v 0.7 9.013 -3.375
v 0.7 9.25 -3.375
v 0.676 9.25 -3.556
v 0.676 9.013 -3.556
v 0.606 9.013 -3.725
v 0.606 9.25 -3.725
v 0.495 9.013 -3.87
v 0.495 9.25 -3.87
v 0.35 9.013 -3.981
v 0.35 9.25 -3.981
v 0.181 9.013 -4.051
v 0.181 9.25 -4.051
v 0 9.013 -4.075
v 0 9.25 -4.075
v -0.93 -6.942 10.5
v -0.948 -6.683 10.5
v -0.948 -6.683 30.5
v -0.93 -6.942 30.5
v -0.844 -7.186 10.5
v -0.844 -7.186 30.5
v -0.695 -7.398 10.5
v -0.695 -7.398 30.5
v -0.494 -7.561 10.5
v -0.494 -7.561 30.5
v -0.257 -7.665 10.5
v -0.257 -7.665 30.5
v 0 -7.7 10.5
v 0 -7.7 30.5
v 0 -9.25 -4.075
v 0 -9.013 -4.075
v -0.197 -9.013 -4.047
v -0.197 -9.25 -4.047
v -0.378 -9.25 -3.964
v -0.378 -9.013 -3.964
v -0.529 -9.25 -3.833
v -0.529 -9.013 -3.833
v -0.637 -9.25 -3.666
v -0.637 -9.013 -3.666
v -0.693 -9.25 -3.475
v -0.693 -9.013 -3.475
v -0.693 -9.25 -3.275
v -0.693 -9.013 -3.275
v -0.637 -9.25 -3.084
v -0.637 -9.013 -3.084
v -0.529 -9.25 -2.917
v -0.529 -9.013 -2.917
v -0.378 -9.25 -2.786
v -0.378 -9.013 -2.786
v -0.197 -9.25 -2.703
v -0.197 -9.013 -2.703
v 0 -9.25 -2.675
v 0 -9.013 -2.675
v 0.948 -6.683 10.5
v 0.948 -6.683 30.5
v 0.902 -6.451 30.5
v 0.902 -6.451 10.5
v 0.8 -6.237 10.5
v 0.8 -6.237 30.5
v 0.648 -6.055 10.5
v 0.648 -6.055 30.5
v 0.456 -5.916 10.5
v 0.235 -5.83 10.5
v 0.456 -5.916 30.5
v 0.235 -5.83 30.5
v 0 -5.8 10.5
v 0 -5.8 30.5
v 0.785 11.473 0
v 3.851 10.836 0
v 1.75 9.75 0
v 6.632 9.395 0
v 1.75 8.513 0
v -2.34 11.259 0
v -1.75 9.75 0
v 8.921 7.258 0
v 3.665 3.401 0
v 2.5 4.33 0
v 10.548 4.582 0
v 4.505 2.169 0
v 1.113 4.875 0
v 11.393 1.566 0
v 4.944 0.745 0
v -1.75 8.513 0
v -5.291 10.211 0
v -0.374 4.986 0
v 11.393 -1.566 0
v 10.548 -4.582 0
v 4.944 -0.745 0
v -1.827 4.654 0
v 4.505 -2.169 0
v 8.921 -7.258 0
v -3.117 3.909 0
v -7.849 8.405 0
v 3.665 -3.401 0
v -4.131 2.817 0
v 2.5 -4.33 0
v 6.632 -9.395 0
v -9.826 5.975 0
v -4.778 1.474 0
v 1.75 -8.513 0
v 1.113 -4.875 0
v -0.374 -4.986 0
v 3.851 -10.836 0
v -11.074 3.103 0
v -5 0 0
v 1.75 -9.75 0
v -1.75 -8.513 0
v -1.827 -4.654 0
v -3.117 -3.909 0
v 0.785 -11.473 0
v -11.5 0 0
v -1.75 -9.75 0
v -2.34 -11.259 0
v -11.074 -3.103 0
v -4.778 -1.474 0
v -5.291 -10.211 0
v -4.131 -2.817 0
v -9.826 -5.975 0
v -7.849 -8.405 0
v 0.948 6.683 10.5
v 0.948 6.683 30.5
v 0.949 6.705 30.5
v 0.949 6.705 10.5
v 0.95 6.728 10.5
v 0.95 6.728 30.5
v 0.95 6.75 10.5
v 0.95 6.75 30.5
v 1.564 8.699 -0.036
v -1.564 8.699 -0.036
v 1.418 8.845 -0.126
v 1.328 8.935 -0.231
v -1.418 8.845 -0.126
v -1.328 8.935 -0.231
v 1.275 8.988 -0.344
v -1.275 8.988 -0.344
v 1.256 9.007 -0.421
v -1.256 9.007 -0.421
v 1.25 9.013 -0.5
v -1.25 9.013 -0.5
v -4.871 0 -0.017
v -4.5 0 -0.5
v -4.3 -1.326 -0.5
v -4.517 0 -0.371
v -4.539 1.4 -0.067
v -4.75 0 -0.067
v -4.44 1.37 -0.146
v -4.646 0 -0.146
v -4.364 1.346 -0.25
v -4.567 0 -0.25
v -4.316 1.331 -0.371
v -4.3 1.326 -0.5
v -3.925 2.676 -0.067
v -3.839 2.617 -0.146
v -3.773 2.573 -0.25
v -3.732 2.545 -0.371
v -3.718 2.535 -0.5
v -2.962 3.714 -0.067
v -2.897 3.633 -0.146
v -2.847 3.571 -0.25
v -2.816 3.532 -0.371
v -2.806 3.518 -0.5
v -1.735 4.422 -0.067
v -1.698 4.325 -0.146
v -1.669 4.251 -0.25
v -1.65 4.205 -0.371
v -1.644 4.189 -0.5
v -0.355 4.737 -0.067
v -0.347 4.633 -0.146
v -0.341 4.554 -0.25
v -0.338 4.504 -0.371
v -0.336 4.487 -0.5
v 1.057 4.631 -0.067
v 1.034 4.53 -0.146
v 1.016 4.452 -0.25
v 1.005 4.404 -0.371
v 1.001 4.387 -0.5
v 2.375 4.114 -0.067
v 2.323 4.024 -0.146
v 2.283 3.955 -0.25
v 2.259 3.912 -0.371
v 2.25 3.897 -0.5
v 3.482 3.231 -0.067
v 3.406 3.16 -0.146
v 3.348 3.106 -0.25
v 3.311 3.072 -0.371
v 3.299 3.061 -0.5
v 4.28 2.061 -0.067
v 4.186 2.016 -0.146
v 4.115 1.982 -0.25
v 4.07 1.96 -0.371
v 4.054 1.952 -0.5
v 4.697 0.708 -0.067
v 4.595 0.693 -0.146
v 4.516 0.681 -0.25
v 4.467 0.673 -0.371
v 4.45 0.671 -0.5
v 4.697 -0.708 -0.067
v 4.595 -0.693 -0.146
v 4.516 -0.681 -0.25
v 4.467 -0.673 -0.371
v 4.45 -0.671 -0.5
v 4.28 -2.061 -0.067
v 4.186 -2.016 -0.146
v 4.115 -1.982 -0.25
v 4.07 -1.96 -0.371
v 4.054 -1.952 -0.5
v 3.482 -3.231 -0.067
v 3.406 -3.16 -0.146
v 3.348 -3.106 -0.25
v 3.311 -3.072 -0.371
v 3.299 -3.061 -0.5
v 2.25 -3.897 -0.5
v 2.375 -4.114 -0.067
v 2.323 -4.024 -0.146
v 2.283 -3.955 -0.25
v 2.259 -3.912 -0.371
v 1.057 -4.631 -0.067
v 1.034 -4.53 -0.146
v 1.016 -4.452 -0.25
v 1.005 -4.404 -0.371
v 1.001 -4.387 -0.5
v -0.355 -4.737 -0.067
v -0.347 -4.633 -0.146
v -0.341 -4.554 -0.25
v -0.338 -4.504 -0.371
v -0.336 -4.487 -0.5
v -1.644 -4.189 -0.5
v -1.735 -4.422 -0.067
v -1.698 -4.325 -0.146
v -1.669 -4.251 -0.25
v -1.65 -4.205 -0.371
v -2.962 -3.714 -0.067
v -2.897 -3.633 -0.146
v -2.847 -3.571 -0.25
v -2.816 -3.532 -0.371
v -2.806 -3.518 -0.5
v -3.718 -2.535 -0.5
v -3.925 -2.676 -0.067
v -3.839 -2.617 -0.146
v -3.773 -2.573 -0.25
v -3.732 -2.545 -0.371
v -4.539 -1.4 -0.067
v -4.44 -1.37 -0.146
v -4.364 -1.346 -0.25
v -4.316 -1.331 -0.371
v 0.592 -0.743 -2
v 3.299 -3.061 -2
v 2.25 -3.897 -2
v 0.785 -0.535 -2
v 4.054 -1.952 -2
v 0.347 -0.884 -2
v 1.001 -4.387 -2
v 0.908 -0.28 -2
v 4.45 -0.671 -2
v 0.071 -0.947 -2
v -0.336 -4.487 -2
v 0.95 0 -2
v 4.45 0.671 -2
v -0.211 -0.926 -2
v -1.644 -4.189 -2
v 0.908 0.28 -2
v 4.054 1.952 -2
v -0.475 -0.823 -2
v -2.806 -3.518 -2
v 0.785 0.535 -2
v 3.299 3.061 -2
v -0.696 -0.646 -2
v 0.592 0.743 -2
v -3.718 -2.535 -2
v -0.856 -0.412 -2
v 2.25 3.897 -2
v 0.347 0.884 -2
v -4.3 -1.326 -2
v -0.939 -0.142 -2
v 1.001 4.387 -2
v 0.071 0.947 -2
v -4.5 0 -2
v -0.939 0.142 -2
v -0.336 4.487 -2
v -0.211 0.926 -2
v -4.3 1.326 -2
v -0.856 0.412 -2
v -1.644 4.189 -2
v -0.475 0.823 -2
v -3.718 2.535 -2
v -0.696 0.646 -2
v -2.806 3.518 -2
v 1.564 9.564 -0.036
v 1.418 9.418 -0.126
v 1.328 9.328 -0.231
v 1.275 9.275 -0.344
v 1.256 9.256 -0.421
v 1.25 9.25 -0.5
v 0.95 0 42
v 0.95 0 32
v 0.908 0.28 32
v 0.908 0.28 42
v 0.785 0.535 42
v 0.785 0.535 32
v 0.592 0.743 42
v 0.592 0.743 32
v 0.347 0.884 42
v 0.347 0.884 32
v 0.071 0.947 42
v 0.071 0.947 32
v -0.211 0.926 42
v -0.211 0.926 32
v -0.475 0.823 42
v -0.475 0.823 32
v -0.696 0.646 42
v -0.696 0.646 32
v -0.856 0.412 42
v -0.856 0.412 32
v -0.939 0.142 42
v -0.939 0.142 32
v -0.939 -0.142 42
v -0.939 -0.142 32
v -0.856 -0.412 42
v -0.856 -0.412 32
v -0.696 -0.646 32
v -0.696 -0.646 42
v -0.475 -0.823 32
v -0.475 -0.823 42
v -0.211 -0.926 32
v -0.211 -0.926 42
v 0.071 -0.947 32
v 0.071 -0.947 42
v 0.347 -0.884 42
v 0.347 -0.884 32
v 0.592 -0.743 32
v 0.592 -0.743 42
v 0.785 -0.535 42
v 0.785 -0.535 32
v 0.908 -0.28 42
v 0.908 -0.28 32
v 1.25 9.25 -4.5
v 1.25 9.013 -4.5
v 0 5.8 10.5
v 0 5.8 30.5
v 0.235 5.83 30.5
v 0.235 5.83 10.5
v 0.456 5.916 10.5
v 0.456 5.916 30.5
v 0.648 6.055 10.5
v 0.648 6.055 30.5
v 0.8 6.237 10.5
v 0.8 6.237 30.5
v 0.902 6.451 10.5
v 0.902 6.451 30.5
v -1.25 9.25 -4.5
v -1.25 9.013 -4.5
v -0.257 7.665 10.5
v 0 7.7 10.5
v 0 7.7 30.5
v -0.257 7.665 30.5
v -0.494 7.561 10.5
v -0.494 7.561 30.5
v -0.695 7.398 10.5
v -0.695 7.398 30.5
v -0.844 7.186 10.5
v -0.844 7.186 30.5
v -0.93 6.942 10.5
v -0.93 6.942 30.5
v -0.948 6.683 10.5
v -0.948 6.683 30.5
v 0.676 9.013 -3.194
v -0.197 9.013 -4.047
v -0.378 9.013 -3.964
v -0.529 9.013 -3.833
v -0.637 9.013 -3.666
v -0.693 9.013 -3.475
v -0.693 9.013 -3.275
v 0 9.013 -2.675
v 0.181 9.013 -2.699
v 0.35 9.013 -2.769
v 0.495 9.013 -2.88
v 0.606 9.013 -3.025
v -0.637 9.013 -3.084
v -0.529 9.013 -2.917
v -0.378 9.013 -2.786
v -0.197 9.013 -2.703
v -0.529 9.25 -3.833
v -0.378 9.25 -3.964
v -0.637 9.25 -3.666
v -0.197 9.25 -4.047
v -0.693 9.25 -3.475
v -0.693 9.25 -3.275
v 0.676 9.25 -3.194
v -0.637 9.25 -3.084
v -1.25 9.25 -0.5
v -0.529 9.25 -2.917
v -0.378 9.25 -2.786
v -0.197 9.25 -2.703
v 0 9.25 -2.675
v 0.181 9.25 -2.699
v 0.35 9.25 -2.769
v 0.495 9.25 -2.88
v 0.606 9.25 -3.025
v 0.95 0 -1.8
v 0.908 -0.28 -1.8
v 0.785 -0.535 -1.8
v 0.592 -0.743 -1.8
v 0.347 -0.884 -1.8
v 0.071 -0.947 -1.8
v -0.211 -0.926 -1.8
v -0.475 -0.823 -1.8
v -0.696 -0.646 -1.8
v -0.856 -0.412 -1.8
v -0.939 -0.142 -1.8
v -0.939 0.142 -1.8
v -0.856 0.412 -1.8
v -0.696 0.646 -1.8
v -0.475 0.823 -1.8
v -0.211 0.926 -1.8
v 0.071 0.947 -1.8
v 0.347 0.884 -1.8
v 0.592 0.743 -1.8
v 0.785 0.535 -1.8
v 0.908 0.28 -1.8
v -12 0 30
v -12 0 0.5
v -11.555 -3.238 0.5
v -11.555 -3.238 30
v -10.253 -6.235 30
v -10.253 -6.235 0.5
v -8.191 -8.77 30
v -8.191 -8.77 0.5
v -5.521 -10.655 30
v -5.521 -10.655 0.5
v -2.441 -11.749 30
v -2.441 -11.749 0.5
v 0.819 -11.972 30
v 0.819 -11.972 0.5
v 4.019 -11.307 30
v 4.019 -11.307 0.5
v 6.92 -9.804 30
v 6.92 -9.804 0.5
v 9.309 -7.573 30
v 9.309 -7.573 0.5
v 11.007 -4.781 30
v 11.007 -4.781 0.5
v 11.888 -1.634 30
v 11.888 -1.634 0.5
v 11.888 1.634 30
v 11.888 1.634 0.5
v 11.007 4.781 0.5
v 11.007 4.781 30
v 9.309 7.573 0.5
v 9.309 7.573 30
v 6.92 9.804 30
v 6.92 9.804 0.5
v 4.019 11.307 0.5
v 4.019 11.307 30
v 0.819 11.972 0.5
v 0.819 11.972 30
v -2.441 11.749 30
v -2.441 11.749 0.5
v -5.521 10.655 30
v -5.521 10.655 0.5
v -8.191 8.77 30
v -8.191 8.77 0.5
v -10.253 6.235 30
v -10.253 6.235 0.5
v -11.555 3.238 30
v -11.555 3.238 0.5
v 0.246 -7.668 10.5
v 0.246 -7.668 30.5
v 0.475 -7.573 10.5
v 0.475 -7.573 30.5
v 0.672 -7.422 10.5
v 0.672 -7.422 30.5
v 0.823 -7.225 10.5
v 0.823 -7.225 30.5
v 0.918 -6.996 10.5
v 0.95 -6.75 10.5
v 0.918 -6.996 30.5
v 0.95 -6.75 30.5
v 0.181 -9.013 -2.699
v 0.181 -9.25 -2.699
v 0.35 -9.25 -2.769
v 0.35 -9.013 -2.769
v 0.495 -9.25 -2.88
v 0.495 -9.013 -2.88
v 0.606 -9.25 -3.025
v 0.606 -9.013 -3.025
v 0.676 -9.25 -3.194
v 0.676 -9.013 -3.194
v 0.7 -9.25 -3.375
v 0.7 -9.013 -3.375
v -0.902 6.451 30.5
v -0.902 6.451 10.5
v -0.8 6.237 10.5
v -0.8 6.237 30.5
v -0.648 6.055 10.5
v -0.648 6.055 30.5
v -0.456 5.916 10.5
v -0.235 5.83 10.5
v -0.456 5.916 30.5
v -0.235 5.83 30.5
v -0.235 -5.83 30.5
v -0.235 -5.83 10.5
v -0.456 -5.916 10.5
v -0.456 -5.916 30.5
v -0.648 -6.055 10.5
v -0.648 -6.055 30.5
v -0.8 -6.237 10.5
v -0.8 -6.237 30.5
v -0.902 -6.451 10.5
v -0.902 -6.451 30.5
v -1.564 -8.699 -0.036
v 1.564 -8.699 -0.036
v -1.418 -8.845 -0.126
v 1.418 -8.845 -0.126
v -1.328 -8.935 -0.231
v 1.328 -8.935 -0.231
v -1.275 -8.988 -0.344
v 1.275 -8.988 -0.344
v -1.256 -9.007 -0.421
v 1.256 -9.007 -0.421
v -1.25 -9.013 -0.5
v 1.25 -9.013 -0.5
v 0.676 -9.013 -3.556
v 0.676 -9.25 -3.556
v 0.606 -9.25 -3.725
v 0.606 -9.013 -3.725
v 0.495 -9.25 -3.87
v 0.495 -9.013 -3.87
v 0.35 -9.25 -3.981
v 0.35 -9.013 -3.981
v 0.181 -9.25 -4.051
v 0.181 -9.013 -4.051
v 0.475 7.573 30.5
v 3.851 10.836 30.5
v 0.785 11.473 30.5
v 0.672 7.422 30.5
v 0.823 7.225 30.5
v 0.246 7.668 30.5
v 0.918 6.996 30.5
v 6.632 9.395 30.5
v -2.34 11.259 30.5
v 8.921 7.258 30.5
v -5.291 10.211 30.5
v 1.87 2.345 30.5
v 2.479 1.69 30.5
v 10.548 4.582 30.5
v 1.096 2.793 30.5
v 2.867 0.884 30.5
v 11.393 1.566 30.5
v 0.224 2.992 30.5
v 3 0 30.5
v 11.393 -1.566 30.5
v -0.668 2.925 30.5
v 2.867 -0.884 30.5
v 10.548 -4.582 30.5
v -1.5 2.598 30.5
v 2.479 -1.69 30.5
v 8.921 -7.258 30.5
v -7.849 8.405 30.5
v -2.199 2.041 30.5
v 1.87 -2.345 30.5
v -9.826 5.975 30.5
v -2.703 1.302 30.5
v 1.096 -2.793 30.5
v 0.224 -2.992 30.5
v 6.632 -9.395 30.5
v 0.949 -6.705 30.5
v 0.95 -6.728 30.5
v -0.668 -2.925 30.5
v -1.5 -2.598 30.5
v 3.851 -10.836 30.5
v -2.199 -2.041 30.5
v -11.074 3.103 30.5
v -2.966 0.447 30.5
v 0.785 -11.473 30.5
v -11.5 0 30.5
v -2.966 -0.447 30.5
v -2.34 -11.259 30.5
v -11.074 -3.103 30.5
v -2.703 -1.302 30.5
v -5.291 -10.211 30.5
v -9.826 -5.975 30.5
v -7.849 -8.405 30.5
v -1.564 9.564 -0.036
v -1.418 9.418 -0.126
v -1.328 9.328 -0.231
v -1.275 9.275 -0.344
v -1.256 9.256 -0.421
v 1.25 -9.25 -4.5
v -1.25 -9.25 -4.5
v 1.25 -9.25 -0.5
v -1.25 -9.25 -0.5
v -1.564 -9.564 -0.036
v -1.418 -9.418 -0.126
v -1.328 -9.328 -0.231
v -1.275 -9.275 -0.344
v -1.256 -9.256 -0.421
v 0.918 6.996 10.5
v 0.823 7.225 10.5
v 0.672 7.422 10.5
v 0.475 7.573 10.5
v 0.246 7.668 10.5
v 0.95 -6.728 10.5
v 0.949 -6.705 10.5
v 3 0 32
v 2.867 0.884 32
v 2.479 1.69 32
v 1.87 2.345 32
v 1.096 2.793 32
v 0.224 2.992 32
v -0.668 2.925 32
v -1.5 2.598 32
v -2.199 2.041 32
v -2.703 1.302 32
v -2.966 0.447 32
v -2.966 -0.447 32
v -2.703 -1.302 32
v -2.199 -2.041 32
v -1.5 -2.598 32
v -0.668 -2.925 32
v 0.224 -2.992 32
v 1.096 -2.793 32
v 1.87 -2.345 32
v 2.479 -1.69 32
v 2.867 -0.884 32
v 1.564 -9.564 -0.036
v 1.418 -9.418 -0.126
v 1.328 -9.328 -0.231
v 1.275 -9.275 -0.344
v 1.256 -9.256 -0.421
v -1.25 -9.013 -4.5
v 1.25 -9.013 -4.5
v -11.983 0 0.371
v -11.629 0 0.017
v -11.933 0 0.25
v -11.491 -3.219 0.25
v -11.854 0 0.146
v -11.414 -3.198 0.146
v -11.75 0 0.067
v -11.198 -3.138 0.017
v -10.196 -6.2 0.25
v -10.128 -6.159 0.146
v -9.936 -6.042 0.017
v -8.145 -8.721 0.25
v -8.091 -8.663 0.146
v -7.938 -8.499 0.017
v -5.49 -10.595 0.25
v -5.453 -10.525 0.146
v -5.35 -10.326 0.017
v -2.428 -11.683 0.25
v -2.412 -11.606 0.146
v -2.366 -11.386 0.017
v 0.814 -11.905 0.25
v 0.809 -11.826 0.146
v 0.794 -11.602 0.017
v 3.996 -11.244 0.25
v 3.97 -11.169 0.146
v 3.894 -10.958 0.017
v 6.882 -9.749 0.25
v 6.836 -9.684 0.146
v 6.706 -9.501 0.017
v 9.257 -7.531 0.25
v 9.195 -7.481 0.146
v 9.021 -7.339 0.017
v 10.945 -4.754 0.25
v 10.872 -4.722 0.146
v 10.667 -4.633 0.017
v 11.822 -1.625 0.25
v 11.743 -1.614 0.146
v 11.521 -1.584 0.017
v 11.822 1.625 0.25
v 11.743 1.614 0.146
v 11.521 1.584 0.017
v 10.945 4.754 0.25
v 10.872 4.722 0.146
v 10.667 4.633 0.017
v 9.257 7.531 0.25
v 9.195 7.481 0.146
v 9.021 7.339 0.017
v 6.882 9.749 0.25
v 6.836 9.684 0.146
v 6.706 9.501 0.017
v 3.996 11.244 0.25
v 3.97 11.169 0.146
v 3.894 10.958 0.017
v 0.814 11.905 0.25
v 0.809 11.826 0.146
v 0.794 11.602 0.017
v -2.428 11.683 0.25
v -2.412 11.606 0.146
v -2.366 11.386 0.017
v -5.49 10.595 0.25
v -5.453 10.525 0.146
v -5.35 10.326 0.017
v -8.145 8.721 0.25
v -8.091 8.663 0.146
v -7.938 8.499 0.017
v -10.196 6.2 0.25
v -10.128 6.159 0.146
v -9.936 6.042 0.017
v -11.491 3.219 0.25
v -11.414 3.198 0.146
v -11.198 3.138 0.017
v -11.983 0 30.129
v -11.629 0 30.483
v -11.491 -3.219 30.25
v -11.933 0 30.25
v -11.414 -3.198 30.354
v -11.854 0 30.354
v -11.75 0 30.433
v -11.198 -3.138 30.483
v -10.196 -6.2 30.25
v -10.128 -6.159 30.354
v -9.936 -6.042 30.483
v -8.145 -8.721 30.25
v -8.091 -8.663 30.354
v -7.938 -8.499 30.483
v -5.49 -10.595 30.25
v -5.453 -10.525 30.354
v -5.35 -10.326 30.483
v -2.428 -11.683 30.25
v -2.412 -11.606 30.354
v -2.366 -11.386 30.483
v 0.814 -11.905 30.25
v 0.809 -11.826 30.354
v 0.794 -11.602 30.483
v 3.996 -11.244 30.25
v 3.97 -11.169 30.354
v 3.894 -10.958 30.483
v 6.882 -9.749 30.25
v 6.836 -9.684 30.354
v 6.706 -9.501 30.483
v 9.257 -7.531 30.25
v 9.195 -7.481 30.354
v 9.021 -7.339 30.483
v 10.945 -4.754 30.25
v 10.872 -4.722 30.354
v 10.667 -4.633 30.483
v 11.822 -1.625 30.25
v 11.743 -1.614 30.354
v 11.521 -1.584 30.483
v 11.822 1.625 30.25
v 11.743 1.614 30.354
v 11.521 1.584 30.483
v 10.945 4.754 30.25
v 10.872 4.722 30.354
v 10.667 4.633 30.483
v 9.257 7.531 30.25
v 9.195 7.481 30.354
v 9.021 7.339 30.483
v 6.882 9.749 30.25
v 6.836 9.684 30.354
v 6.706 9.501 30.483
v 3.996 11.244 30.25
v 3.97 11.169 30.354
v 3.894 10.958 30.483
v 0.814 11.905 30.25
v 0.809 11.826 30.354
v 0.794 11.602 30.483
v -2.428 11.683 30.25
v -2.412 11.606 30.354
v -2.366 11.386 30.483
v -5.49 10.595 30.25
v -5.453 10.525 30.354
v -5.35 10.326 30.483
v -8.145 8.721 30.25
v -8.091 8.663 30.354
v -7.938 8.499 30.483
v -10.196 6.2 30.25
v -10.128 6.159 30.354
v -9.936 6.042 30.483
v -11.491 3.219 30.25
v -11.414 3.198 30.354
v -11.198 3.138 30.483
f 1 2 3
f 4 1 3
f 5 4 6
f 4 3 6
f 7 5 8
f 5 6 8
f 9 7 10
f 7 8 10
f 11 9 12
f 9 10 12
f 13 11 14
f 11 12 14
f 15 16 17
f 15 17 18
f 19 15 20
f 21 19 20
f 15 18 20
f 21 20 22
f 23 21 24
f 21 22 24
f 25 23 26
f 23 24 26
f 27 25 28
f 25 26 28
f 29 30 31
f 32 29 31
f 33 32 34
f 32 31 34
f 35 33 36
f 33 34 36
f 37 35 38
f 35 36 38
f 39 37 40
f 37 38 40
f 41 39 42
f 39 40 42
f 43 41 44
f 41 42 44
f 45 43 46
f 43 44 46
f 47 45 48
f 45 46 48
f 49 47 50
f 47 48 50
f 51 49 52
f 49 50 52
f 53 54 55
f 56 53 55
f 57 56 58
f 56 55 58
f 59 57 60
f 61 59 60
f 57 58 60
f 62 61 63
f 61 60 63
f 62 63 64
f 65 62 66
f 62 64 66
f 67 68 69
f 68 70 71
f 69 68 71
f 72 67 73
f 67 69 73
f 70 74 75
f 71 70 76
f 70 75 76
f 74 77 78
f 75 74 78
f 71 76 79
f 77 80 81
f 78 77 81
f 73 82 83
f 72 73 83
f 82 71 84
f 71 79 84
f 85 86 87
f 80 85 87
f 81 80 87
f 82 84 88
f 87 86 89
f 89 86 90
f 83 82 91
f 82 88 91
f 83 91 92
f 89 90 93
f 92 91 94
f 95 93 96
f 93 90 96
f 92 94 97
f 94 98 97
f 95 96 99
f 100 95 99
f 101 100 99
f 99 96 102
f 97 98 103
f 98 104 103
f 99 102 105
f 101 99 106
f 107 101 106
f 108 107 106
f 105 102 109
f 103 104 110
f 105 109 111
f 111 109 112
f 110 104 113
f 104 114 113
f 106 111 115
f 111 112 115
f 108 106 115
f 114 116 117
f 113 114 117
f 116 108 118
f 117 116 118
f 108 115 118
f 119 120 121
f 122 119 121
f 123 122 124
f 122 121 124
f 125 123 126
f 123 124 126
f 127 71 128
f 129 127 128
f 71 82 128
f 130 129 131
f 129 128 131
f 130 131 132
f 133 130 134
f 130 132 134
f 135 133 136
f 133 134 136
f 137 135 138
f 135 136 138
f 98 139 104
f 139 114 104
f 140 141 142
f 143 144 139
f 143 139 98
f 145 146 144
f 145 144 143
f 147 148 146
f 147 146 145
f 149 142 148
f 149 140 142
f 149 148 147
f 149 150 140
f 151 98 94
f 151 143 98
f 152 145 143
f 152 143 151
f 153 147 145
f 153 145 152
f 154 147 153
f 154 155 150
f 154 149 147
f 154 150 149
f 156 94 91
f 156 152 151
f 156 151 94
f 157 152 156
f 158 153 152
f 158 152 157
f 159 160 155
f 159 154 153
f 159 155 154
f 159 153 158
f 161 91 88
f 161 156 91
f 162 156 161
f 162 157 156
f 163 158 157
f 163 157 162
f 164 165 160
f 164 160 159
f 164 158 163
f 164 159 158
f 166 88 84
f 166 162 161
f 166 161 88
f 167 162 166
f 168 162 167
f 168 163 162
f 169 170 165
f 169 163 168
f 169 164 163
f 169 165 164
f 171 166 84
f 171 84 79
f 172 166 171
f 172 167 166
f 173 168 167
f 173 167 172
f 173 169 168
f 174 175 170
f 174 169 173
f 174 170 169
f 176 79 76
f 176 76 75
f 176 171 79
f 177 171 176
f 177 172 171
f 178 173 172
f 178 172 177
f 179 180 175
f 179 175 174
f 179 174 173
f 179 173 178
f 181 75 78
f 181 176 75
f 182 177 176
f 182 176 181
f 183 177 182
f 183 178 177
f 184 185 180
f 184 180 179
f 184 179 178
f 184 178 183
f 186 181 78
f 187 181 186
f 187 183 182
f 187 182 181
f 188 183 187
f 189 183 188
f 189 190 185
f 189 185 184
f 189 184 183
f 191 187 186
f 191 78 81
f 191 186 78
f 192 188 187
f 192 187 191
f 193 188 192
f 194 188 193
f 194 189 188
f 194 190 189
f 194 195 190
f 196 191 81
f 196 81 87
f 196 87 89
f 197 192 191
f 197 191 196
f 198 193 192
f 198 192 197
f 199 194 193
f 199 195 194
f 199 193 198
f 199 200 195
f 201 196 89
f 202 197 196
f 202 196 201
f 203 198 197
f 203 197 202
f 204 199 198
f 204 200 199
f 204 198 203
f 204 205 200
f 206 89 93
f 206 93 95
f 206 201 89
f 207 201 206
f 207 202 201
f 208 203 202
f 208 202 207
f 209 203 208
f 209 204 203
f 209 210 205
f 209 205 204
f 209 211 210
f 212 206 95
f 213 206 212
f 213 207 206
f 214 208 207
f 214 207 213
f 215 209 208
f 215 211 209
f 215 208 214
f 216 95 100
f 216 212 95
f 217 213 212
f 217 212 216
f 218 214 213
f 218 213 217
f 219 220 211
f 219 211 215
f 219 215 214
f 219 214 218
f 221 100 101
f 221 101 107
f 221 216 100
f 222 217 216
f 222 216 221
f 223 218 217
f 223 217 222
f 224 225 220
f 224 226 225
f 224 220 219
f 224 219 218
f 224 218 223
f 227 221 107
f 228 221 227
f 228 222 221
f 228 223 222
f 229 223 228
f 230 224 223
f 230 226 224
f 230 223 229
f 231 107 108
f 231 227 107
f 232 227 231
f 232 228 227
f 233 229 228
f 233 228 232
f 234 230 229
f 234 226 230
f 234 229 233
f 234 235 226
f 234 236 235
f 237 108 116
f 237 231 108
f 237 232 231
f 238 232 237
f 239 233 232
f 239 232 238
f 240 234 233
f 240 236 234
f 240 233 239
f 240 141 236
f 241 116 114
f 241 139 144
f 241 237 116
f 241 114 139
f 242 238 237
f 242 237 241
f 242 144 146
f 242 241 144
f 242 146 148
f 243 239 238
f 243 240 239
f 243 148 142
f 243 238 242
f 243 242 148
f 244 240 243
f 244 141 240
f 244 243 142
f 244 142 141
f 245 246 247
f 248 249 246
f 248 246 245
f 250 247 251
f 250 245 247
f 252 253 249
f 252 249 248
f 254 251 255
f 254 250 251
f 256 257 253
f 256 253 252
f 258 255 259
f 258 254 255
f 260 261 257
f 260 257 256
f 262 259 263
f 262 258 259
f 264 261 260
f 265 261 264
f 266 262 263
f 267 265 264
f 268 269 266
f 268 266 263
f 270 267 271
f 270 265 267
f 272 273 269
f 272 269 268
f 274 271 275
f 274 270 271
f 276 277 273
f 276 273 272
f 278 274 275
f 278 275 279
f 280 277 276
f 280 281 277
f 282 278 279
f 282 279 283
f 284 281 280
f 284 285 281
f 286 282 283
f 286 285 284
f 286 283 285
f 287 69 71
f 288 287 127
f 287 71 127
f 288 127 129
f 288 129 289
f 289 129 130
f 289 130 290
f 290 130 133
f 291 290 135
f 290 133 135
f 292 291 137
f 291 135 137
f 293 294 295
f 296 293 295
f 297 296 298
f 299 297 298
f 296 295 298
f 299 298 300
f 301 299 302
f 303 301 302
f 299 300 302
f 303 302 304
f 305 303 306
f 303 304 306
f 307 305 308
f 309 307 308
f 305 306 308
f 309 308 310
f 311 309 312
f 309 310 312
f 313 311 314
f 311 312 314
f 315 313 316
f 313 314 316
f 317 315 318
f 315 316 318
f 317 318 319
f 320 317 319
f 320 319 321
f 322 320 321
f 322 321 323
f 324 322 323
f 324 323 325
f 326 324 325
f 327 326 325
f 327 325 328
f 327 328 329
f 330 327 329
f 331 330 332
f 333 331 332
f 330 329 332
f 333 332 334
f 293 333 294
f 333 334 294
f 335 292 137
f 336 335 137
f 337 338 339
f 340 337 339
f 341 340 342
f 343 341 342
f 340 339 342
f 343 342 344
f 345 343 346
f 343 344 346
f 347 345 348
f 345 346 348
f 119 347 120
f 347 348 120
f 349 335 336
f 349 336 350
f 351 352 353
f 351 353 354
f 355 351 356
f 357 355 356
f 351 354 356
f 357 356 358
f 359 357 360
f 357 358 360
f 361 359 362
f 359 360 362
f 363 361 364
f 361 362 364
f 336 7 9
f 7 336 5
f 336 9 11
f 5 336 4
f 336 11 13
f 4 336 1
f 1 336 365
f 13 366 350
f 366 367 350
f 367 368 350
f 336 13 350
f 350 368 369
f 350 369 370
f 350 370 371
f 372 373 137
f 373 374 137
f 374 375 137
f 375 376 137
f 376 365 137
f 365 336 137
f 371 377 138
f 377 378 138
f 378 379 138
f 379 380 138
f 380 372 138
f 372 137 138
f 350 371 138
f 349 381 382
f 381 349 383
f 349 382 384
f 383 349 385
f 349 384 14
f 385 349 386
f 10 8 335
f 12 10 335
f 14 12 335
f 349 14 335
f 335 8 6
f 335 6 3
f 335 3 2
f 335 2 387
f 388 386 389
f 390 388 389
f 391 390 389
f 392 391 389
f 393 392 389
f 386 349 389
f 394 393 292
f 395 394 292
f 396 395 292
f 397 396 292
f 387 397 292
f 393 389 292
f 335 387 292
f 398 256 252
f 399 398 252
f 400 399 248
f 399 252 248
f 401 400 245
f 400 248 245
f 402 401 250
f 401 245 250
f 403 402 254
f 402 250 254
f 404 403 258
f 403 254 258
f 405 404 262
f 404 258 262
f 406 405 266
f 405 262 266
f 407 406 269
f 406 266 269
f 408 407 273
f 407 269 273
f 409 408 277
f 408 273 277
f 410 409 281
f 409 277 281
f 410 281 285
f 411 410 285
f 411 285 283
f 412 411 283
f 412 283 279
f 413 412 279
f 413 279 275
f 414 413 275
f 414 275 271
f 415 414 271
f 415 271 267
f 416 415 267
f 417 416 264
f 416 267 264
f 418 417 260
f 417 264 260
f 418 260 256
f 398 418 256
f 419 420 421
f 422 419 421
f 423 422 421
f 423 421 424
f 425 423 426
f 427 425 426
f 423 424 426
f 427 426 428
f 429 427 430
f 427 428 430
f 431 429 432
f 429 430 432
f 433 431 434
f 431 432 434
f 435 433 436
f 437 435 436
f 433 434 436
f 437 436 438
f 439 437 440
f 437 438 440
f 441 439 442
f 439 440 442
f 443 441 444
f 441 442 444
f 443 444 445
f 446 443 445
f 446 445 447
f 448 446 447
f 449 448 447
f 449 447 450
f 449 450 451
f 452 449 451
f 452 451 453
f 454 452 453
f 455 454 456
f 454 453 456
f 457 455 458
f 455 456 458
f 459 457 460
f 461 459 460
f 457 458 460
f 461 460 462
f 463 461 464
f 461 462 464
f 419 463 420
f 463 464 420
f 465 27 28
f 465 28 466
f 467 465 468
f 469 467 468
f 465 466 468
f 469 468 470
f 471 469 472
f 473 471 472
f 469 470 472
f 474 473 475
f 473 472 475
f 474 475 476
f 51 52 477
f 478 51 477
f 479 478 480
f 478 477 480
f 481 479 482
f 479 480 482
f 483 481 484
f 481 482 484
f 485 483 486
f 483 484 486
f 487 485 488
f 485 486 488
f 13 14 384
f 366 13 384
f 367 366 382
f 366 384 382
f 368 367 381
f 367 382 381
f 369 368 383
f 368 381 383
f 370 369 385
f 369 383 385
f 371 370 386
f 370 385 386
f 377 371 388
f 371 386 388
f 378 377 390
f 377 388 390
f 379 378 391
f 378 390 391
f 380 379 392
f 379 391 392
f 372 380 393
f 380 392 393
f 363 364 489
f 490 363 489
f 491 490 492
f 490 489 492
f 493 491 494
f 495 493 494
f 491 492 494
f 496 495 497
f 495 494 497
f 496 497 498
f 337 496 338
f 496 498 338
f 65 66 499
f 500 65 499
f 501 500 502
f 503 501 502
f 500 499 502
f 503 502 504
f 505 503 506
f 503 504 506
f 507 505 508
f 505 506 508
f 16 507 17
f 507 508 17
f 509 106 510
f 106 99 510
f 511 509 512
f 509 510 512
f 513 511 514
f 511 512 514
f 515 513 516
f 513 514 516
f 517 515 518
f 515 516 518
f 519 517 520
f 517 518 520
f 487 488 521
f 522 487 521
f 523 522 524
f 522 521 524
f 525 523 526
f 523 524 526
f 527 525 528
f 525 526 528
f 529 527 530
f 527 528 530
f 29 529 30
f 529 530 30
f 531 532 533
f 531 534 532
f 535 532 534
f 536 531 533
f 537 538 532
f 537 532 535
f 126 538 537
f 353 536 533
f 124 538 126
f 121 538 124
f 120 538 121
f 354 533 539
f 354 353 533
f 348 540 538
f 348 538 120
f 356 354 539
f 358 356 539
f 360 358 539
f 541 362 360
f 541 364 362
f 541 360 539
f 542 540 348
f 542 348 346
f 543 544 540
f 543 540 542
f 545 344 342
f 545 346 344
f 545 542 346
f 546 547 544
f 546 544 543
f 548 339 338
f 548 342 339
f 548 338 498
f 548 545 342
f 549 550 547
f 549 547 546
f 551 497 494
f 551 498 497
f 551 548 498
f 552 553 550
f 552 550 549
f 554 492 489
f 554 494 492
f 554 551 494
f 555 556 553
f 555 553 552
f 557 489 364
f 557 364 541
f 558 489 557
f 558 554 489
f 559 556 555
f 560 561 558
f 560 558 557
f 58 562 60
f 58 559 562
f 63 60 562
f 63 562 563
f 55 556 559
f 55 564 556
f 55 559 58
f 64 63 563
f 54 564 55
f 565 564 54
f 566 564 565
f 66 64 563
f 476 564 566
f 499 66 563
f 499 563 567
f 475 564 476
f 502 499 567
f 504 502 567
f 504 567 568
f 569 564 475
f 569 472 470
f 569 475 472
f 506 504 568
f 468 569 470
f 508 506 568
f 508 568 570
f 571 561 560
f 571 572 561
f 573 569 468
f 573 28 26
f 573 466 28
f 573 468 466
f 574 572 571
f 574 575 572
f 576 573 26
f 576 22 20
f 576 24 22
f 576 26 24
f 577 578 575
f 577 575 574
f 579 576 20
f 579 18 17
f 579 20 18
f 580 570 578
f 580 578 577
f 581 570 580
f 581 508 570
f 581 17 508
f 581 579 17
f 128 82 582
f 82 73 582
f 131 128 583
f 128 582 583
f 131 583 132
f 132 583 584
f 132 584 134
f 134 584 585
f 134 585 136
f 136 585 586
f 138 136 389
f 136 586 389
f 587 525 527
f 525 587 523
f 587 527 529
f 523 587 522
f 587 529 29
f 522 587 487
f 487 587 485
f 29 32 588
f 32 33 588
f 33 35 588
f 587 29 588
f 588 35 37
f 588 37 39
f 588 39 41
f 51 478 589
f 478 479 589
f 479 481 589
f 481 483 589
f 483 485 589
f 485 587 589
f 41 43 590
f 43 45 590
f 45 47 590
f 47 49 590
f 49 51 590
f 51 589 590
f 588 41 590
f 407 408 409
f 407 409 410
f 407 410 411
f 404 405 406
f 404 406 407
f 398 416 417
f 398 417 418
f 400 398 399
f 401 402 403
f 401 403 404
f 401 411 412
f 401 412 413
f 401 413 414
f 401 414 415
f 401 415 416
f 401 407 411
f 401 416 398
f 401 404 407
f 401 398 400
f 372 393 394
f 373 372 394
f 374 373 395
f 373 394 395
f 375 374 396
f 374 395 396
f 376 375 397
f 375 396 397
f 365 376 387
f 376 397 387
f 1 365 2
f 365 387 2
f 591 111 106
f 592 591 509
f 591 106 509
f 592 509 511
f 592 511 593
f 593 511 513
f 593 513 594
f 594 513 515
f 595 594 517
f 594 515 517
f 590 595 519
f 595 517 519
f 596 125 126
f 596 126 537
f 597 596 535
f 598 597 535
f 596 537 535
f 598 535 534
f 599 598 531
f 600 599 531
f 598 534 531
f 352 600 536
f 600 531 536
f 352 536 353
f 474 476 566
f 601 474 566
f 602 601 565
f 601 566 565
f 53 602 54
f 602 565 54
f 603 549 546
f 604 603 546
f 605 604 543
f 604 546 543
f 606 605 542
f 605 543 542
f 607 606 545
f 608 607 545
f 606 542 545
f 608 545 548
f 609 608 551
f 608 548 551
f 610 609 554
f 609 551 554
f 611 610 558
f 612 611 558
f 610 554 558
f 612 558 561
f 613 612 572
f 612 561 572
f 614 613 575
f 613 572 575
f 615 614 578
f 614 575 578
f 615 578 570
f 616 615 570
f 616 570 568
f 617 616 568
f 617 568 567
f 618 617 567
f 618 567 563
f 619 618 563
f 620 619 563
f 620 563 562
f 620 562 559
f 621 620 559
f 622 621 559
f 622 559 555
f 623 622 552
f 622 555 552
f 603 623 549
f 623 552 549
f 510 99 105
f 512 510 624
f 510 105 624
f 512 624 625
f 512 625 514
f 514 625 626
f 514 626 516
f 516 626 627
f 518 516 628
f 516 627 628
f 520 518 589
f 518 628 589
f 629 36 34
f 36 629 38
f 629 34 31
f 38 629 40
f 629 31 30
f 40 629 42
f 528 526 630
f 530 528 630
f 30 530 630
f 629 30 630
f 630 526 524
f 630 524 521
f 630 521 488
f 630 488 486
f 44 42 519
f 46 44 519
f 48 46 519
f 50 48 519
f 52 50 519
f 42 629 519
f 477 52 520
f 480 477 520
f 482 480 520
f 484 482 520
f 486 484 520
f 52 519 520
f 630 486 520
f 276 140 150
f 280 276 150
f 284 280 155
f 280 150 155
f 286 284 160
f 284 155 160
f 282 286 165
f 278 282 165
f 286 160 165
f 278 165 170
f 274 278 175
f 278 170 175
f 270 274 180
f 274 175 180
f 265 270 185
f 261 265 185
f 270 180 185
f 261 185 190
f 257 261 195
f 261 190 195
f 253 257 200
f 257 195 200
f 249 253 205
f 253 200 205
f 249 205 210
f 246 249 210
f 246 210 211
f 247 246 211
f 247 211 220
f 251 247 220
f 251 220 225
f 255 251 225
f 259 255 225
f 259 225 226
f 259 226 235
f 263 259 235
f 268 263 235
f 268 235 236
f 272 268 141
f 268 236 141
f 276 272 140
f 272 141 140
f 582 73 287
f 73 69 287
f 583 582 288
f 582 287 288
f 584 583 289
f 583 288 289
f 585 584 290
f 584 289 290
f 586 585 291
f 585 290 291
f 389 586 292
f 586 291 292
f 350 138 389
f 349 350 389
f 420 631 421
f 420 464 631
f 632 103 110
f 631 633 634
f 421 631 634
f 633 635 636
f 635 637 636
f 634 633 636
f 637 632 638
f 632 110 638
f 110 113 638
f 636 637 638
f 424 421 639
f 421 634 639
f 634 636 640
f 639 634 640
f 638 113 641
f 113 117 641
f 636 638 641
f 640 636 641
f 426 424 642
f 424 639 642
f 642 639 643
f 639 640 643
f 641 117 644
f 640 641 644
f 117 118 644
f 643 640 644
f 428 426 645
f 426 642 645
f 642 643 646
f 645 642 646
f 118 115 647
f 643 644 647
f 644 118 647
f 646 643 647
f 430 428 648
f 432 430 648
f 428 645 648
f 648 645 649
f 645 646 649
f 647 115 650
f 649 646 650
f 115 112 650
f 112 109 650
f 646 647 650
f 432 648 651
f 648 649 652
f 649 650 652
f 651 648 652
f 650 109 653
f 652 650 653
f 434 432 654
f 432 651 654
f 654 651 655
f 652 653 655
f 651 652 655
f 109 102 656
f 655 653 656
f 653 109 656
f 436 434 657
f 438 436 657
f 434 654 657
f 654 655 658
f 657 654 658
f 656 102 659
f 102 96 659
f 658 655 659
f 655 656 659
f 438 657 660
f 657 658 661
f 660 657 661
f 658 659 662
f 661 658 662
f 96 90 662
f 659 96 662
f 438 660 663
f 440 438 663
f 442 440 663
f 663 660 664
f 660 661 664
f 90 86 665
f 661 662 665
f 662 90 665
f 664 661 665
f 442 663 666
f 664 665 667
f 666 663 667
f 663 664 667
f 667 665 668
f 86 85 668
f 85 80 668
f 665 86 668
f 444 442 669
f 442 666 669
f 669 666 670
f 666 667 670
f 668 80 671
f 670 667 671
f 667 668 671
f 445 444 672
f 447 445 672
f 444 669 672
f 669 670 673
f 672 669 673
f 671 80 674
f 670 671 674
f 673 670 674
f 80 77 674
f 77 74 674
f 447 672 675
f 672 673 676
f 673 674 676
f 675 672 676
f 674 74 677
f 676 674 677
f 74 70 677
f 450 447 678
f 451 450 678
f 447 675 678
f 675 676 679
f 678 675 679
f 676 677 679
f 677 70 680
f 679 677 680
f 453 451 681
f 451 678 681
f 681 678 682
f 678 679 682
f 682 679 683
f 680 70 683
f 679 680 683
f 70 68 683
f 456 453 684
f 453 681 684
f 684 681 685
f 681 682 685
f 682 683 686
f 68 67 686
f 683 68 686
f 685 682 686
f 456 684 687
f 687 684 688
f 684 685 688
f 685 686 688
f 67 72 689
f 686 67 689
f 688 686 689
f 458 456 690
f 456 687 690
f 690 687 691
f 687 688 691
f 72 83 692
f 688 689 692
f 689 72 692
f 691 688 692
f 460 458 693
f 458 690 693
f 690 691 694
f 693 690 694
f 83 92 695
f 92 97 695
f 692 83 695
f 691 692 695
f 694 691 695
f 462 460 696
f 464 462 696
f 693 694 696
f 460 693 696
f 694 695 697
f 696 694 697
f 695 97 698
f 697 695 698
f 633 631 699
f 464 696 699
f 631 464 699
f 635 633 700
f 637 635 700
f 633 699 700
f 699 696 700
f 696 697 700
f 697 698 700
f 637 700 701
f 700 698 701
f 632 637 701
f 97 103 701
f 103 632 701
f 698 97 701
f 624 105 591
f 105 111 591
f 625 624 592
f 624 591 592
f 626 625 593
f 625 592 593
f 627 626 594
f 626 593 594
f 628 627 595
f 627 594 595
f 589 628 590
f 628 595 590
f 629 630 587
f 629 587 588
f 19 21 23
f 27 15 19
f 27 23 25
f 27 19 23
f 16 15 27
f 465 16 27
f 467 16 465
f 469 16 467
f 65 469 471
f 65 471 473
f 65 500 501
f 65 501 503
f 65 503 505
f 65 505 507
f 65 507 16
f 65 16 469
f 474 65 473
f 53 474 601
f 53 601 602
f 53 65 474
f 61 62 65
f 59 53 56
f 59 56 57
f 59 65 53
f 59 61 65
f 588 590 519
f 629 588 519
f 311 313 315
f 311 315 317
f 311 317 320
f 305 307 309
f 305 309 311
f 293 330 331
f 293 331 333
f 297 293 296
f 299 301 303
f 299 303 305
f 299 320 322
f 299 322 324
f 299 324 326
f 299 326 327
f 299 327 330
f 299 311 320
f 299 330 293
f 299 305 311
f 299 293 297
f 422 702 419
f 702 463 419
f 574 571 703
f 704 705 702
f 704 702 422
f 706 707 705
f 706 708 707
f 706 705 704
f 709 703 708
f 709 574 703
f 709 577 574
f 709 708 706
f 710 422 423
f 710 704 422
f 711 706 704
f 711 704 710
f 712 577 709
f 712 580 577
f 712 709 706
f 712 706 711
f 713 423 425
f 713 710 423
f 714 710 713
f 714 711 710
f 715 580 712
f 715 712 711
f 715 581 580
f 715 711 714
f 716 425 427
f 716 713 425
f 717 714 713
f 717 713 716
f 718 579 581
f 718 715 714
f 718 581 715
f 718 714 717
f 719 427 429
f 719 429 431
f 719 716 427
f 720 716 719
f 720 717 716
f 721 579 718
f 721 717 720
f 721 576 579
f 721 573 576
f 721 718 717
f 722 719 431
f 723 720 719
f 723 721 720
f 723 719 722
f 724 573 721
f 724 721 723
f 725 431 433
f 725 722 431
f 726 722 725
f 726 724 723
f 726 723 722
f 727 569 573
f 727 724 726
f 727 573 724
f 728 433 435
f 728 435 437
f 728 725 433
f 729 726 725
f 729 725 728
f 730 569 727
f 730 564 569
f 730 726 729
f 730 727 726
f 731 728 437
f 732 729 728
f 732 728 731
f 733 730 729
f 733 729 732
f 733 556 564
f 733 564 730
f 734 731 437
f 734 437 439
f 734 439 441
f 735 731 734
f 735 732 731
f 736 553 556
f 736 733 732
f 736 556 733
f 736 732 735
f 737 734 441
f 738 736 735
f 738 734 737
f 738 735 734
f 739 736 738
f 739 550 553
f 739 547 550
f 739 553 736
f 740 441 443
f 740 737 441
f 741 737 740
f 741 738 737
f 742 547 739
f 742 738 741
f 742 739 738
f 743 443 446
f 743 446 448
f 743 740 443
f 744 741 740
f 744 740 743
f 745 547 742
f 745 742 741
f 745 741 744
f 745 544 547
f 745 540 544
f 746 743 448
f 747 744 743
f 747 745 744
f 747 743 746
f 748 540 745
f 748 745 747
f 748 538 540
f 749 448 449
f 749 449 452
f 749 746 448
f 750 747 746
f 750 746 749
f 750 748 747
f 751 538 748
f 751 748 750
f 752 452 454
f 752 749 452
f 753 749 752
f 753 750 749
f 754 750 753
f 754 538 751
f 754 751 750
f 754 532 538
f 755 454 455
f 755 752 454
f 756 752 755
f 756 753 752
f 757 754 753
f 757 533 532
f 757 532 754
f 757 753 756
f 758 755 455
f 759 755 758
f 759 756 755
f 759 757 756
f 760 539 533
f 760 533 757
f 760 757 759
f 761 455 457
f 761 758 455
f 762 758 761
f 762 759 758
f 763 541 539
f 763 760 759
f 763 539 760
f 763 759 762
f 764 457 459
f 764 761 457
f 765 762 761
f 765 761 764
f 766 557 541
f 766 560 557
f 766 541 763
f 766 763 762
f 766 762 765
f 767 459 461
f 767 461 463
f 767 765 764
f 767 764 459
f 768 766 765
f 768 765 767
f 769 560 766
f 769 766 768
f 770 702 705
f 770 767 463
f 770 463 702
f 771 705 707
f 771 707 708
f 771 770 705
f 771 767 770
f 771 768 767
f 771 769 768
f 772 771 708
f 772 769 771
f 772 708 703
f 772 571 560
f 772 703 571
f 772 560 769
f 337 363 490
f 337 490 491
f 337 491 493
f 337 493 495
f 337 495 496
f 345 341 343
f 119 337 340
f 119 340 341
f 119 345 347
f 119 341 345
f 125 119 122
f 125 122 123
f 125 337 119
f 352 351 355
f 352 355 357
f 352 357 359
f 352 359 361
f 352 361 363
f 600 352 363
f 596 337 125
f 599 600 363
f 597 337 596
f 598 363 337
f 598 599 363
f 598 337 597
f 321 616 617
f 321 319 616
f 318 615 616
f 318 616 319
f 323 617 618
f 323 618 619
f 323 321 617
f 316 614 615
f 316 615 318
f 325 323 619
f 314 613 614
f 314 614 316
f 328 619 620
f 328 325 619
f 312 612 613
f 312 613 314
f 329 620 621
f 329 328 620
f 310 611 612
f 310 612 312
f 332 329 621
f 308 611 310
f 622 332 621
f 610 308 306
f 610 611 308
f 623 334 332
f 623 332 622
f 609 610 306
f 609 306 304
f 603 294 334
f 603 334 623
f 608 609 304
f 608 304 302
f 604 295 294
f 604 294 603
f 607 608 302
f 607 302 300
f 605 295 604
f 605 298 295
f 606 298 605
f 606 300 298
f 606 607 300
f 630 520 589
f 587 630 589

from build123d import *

# Parameters (mm, degrees)
ESQUISSE1_R             = 12
BOSS_EXTRU_1_DEPTH      = 30.5
ESQUISSE2_R             = 4.5
BOSS_EXTRU_2_DEPTH      = 2
ESQUISSE3_R             = 3
BOSS_EXTRU_3_DEPTH      = 1.5
BOSS_EXTRU_4_DEPTH      = 4.5
ENL_V_MAT_EXTRU_1_DEPTH = 29.5
ESQUISSE6_R             = 0.95
BOSS_EXTRU_5_DEPTH      = 10
ESQUISSE7_R             = 0.95
ENL_V_MAT_EXTRU_2_DEPTH = 0.2
CONG_1_R                = 0.5
CONG_2_R                = 0.5
ENL_V_MAT_EXTRU_3_DEPTH = 20


with BuildPart() as part:
    # Esquisse1 → Boss.-Extru.1 (new body)
    with BuildSketch(Plane.XY):
        with Locations(Location((0, 0, 0), (0, 0, 180))):
            Circle(ESQUISSE1_R)
    extrude(amount=BOSS_EXTRU_1_DEPTH)

    # Esquisse2 → Boss.-Extru.2 (add)
    with BuildSketch(Plane(origin=(0, 0, 0), x_dir=(-1, 0, 0), z_dir=(0, 0, -1))):
        Circle(ESQUISSE2_R)
    extrude(amount=BOSS_EXTRU_2_DEPTH)

    # Esquisse3 → Boss.-Extru.3 (add)
    with BuildSketch(Plane.XY.offset(30.5)):
        Circle(ESQUISSE3_R)
    extrude(amount=BOSS_EXTRU_3_DEPTH)

    # Esquisse4 → Boss.-Extru.4 (add)
    with BuildSketch(Plane(origin=(0, 0, 0), x_dir=(-1, 0, 0), z_dir=(0, 0, -1))):
        with BuildLine():
            Line((0, -9.25), (0, -9.012847415))
            Line((0, -9.012847415), (-1.25, -9.012847415))
            Line((-1.25, -9.012847415), (-1.25, -9.16515139))
            ThreePointArc((-1.25, -9.16515139), (-0.626438203, -9.22876347), (0, -9.25))
        make_face()
        with BuildLine():
            Line((-1.25, -9.25), (0, -9.25))
            ThreePointArc((0, -9.25), (-0.626438203, -9.22876347), (-1.25, -9.16515139))
            Line((-1.25, -9.16515139), (-1.25, -9.25))
        make_face()
        with BuildLine():
            Line((1.25, -9.012847415), (0, -9.012847415))
            Line((0, -9.012847415), (0, -9.25))
            ThreePointArc((0, -9.25), (0.626438203, -9.22876347), (1.25, -9.16515139))
            Line((1.25, -9.16515139), (1.25, -9.012847415))
        make_face()
        with BuildLine():
            ThreePointArc((1.25, -9.16515139), (0.626438203, -9.22876347), (0, -9.25))
            Line((0, -9.25), (1.25, -9.25))
            Line((1.25, -9.25), (1.25, -9.16515139))
        make_face()
        with BuildLine():
            Line((0, 9.25), (0, 9.012847415))
            Line((0, 9.012847415), (1.25, 9.012847415))
            Line((1.25, 9.012847415), (1.25, 9.16515139))
            ThreePointArc((1.25, 9.16515139), (0.626438203, 9.22876347), (0, 9.25))
        make_face()
        with BuildLine():
            ThreePointArc((0, 9.25), (0.626438203, 9.22876347), (1.25, 9.16515139))
            Line((1.25, 9.16515139), (1.25, 9.25))
            Line((1.25, 9.25), (0, 9.25))
        make_face()
        with BuildLine():
            Line((-1.25, 9.012847415), (0, 9.012847415))
            Line((0, 9.012847415), (0, 9.25))
            ThreePointArc((0, 9.25), (-0.626438203, 9.22876347), (-1.25, 9.16515139))
            Line((-1.25, 9.16515139), (-1.25, 9.012847415))
        make_face()
        with BuildLine():
            Line((-1.25, 9.25), (-1.25, 9.16515139))
            ThreePointArc((-1.25, 9.16515139), (-0.626438203, 9.22876347), (0, 9.25))
            Line((0, 9.25), (-1.25, 9.25))
        make_face()
    extrude(amount=BOSS_EXTRU_4_DEPTH)

    # Esquisse5 → Enlèv. mat.-Extru.1 (cut)
    with BuildSketch(Plane(origin=(0, 9.25, 0), x_dir=(1, 0, 0), z_dir=(0, 1, 0))):
        with BuildLine():
            ThreePointArc((0.7, 3.375), (0.494974747, 3.869974747), (0, 4.075))
            Line((0, 4.075), (0, 2.675))
            ThreePointArc((0, 2.675), (0.494974747, 2.880025253), (0.7, 3.375))
        make_face()
        with BuildLine():
            Line((0, 2.675), (0, 4.075))
            ThreePointArc((0, 4.075), (-0.7, 3.375), (0, 2.675))
        make_face()
    extrude(amount=-ENL_V_MAT_EXTRU_1_DEPTH, mode=Mode.SUBTRACT)

    # Esquisse6 → Boss.-Extru.5 (add)
    with BuildSketch(Plane.XY.offset(32)):
        Circle(ESQUISSE6_R)
    extrude(amount=BOSS_EXTRU_5_DEPTH)

    # Esquisse7 → Enlèv. mat.-Extru.2 (cut)
    with BuildSketch(Plane(origin=(0, 0, -2), x_dir=(-1, 0, 0), z_dir=(0, 0, -1))):
        with Locations(Location((0, 0, 0), (0, 0, 180))):
            Circle(ESQUISSE7_R)
    extrude(amount=-ENL_V_MAT_EXTRU_2_DEPTH, mode=Mode.SUBTRACT)

    # Congé1
    cong_1_edges = [part.edges().sort_by_distance(p)[0] for p in [
        (12, 0, 30.5),
    ]]
    fillet(cong_1_edges, radius=CONG_1_R)

    # Congé2
    cong_2_edges = [part.edges().sort_by_distance(p)[0] for p in [
        (-1.25, -9.131423708, 0),
        (1.25, -9.131423708, 0),
        (0, -9.012847415, 0),
        (0, -9.25, 0),
        (12, 0, 0),
        (1.25, 9.131423708, 0),
        (0, 9.012847415, 0),
        (-1.25, 9.131423708, 0),
        (0, 9.25, 0),
        (4.5, 0, 0),
    ]]
    fillet(cong_2_edges, radius=CONG_2_R)

    # Esquisse8 → Enlèv. mat.-Extru.3 (cut)
    with BuildSketch(Plane.XY.offset(30.5)):
        with BuildLine():
            ThreePointArc((-0.947644886, 6.683148148), (-0.647684623, 6.055014655), (0, 5.8))
            Line((0, 5.8), (0, 6.75))
            ThreePointArc((0, 6.75), (-0.475, 6.733266295), (-0.947644886, 6.683148148))
        make_face()
        with BuildLine():
            Line((0, 6.75), (0, 5.8))
            ThreePointArc((0, 5.8), (0.647684623, 6.055014655), (0.947644886, 6.683148148))
            ThreePointArc((0.947644886, 6.683148148), (0.475, 6.733266295), (0, 6.75))
        make_face()
        with BuildLine():
            ThreePointArc((-0.947644886, 6.683148148), (-0.475, 6.733266295), (0, 6.75))
            Line((0, 6.75), (0, 7.7))
            ThreePointArc((0, 7.7), (-0.694985345, 7.397684623), (-0.947644886, 6.683148148))
        make_face()
        with BuildLine():
            Line((0, 7.7), (0, 6.75))
            ThreePointArc((0, 6.75), (0.475, 6.733266295), (0.947644886, 6.683148148))
            ThreePointArc((0.947644886, 6.683148148), (0.949411039, 6.716553339), (0.95, 6.75))
            ThreePointArc((0.95, 6.75), (0.671751442, 7.421751442), (0, 7.7))
        make_face()
        with BuildLine():
            ThreePointArc((0.947644886, -6.683148148), (0.647684623, -6.055014655), (0, -5.8))
            Line((0, -5.8), (0, -6.75))
            ThreePointArc((0, -6.75), (0.475, -6.733266295), (0.947644886, -6.683148148))
        make_face()
        with BuildLine():
            Line((0, -6.75), (0, -5.8))
            ThreePointArc((0, -5.8), (-0.647684623, -6.055014655), (-0.947644886, -6.683148148))
            ThreePointArc((-0.947644886, -6.683148148), (-0.475, -6.733266295), (0, -6.75))
        make_face()
        with BuildLine():
            ThreePointArc((0.947644886, -6.683148148), (0.475, -6.733266295), (0, -6.75))
            Line((0, -6.75), (0, -7.7))
            ThreePointArc((0, -7.7), (0.671751442, -7.421751442), (0.95, -6.75))
            ThreePointArc((0.95, -6.75), (0.949411039, -6.716553339), (0.947644886, -6.683148148))
        make_face()
        with BuildLine():
            Line((0, -7.7), (0, -6.75))
            ThreePointArc((0, -6.75), (-0.475, -6.733266295), (-0.947644886, -6.683148148))
            ThreePointArc((-0.947644886, -6.683148148), (-0.694985345, -7.397684623), (0, -7.7))
        make_face()
    extrude(amount=-ENL_V_MAT_EXTRU_3_DEPTH, mode=Mode.SUBTRACT)


solid = part.part
